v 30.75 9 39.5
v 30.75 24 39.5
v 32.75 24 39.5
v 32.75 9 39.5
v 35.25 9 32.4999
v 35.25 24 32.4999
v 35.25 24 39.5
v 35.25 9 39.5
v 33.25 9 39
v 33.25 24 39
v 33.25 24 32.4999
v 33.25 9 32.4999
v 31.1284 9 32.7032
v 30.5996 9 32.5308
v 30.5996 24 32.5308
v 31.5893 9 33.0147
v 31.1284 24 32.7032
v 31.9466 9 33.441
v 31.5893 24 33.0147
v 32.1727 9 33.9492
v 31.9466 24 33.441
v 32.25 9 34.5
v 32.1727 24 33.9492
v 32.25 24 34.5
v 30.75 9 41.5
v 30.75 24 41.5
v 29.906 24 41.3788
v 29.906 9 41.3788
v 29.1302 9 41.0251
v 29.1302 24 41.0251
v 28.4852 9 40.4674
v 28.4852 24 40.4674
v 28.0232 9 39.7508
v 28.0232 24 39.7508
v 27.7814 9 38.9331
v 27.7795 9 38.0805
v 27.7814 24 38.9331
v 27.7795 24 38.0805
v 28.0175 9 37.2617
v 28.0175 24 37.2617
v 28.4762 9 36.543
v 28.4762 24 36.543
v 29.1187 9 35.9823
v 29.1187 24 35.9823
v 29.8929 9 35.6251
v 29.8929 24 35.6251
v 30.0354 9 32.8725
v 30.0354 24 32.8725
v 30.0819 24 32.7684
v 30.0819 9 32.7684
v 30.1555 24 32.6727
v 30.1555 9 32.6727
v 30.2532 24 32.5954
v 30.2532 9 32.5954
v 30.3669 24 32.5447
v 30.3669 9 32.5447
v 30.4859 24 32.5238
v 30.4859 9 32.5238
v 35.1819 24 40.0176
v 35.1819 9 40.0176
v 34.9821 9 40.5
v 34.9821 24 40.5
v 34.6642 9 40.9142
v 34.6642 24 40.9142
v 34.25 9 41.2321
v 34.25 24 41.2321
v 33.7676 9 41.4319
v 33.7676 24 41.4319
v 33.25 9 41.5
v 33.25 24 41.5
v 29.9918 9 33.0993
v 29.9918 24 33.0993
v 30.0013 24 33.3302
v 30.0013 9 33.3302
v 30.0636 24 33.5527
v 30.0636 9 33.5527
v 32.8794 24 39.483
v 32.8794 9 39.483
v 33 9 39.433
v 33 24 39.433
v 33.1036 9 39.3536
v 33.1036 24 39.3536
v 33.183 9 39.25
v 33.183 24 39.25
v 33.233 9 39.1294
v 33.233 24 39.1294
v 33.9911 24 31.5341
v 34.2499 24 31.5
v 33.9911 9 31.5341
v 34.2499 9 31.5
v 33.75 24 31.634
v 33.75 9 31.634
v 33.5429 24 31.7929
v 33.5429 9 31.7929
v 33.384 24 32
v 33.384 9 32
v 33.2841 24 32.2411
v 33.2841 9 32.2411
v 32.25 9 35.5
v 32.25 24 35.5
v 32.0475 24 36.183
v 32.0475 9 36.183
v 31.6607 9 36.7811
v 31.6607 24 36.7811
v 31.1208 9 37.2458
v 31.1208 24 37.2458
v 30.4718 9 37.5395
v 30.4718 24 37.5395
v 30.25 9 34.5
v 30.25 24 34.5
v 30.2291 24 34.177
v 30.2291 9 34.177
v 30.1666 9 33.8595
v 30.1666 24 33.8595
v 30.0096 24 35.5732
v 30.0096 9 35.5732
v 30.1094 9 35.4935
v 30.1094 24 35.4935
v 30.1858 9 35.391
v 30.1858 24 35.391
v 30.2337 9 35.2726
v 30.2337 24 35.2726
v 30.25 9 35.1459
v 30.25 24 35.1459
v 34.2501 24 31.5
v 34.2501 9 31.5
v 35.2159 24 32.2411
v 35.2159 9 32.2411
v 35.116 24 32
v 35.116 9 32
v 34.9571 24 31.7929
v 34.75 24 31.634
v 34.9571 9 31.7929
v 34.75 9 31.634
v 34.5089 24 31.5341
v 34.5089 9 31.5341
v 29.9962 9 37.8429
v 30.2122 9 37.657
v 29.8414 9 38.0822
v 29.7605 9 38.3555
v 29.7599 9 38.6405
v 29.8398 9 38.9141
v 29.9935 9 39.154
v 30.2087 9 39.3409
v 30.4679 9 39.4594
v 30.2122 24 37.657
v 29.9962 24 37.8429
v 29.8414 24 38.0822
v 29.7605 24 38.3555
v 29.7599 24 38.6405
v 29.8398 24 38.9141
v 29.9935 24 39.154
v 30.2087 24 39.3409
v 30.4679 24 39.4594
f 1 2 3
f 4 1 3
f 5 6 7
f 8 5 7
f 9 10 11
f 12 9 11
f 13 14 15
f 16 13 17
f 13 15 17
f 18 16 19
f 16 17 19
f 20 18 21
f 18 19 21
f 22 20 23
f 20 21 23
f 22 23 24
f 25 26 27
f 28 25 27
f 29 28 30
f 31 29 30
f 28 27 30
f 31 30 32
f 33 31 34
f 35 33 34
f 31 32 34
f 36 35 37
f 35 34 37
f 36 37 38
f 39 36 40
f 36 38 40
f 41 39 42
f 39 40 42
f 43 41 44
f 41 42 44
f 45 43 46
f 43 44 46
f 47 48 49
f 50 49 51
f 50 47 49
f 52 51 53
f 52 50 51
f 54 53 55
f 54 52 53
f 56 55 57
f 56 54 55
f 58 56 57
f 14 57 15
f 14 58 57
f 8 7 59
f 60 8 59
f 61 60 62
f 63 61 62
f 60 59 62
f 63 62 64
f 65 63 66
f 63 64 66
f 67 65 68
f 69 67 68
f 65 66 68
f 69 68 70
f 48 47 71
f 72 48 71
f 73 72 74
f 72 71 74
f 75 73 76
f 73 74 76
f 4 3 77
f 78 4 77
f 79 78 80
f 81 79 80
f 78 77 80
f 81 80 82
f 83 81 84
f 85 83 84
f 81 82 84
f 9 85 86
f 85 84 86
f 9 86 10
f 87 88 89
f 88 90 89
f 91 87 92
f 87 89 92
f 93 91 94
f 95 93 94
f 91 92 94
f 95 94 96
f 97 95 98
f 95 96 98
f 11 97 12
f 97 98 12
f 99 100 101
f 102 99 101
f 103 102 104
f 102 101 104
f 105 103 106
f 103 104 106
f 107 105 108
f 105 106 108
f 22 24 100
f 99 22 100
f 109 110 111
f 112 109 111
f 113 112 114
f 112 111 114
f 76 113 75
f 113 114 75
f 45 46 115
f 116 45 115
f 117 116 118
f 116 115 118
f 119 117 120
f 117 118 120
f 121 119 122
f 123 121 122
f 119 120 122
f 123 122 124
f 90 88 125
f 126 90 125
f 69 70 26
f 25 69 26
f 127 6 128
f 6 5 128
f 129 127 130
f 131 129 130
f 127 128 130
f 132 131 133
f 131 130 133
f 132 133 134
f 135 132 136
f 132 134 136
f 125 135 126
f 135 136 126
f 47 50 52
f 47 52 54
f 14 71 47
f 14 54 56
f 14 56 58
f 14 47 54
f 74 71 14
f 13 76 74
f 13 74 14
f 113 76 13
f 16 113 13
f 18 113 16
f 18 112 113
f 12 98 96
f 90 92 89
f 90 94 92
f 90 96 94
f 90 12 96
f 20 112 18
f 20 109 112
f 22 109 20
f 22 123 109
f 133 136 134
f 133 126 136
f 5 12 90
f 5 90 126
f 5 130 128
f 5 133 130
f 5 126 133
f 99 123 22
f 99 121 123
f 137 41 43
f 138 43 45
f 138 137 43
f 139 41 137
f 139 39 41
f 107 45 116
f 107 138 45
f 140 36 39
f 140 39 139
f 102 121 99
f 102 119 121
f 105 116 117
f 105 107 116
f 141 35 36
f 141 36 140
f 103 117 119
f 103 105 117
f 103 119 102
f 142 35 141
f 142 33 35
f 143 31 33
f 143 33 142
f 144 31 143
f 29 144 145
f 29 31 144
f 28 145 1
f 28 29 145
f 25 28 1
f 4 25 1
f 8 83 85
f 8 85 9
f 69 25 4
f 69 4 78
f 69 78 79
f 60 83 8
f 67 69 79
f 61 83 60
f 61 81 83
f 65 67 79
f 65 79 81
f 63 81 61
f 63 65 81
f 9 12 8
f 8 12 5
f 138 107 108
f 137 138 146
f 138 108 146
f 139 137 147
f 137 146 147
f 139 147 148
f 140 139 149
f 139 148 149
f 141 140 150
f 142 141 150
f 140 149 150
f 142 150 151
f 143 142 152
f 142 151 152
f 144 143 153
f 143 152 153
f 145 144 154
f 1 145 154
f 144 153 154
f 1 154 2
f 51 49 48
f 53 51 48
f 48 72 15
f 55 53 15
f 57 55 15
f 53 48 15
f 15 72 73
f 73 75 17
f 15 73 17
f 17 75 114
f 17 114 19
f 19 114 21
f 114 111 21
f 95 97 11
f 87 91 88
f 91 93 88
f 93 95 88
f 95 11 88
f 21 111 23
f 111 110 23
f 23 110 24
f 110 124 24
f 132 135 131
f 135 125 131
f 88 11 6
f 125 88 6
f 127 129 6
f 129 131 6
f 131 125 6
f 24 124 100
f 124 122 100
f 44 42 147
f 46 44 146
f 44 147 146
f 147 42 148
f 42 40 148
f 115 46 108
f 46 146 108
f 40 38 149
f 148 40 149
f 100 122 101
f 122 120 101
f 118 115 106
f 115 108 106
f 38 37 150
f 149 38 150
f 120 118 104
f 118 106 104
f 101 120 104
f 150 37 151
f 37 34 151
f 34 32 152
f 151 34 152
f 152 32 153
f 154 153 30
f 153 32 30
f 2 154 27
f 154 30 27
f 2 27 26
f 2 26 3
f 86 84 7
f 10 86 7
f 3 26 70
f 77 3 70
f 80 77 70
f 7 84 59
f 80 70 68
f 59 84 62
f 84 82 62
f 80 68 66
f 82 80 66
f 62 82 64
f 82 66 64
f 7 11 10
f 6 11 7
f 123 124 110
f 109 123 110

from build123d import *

# Parameters (mm, degrees)
BOSS_EXTRUDE1_DEPTH      = 7.5
BOSS_EXTRUDE1_DEPTH_BACK = 7.5
FILLET3_R                = 1
FILLET4_R                = 1
FILLET5_R                = 0.5


# Some blends are built 0.0001 mm under size
with BuildPart() as part:
    # Sketch1 → Boss-Extrude1 (new, two sides: drawn at the far end of the back side and taken through both)
    with BuildSketch(Plane.XZ.offset(-16.5).offset(-BOSS_EXTRUDE1_DEPTH_BACK)):
        with BuildLine():
            Line((32.25, 34.5), (32.25, 35.5))
            ThreePointArc((32.25, 35.5), (31.660669064, 36.78109942), (30.471806841, 37.539474849))
            ThreePointArc((30.471806841, 37.539474849), (29.759917895, 38.640489944), (30.75, 39.5))
            Line((30.75, 39.5), (32.75, 39.5))
            ThreePointArc((32.75, 39.5), (33.103553391, 39.353553391), (33.25, 39))
            Line((33.25, 39), (33.25, 31.5))
            Line((33.25, 31.5), (35.25, 31.5))
            Line((35.25, 31.5), (35.25, 39.5))
            ThreePointArc((35.25, 39.5), (34.664213562, 40.914213562), (33.25, 41.5))
            Line((33.25, 41.5), (30.75, 41.5))
            ThreePointArc((30.75, 41.5), (27.781428489, 38.933108746), (29.892857143, 35.625055458))
            ThreePointArc((29.892857143, 35.625055458), (30.150891863, 35.444705186), (30.25, 35.145898034))
            Line((30.25, 35.145898034), (30.25, 34.5))
            ThreePointArc((30.25, 34.5), (29.986067977, 33.381966011), (29.25, 32.5))
            Line((29.25, 32.5), (30.25, 32.5))
            ThreePointArc((30.25, 32.5), (31.664213562, 33.085786438), (32.25, 34.5))
        make_face()
    extrude(amount=BOSS_EXTRUDE1_DEPTH + BOSS_EXTRUDE1_DEPTH_BACK)

    # Fillet3
    # the kernel refuses this fillet: 1 mm, written as the material it takes off along each edge
    with BuildSketch(Plane(origin=(29.25, 5.673991819, 32.5), x_dir=(1, 0, 0), z_dir=(0, 1, 0))) as fillet3_piece_1:
        with BuildLine():
            CenterArc((1.738981007, -0.673726259), FILLET3_R, 137.644685186, 64.623066475)
            ThreePointArc((0.813557862, -1.052661613), (0.478087463, -0.471219443), (0, 0))
            Line((0, 0), (1, 0))
        make_face()
    extrude(amount=21.652016361, mode=Mode.SUBTRACT)

    # Fillet4
    fillet4_edges = [part.edges().sort_by_distance(p)[0] for p in [
        (35.25, 16.5, 31.5),
        (33.25, 16.5, 31.5),
    ]]
    fillet(fillet4_edges, radius=FILLET4_R - 0.0001)  # a hair under: the kernel refuses the full size

    # Fillet5
    fillet5_edges = [part.edges().sort_by_distance(p)[0] for p in [
        (30.25, 16.5, 32.5),
    ]]
    fillet(fillet5_edges, radius=FILLET5_R)


solid = part.part
